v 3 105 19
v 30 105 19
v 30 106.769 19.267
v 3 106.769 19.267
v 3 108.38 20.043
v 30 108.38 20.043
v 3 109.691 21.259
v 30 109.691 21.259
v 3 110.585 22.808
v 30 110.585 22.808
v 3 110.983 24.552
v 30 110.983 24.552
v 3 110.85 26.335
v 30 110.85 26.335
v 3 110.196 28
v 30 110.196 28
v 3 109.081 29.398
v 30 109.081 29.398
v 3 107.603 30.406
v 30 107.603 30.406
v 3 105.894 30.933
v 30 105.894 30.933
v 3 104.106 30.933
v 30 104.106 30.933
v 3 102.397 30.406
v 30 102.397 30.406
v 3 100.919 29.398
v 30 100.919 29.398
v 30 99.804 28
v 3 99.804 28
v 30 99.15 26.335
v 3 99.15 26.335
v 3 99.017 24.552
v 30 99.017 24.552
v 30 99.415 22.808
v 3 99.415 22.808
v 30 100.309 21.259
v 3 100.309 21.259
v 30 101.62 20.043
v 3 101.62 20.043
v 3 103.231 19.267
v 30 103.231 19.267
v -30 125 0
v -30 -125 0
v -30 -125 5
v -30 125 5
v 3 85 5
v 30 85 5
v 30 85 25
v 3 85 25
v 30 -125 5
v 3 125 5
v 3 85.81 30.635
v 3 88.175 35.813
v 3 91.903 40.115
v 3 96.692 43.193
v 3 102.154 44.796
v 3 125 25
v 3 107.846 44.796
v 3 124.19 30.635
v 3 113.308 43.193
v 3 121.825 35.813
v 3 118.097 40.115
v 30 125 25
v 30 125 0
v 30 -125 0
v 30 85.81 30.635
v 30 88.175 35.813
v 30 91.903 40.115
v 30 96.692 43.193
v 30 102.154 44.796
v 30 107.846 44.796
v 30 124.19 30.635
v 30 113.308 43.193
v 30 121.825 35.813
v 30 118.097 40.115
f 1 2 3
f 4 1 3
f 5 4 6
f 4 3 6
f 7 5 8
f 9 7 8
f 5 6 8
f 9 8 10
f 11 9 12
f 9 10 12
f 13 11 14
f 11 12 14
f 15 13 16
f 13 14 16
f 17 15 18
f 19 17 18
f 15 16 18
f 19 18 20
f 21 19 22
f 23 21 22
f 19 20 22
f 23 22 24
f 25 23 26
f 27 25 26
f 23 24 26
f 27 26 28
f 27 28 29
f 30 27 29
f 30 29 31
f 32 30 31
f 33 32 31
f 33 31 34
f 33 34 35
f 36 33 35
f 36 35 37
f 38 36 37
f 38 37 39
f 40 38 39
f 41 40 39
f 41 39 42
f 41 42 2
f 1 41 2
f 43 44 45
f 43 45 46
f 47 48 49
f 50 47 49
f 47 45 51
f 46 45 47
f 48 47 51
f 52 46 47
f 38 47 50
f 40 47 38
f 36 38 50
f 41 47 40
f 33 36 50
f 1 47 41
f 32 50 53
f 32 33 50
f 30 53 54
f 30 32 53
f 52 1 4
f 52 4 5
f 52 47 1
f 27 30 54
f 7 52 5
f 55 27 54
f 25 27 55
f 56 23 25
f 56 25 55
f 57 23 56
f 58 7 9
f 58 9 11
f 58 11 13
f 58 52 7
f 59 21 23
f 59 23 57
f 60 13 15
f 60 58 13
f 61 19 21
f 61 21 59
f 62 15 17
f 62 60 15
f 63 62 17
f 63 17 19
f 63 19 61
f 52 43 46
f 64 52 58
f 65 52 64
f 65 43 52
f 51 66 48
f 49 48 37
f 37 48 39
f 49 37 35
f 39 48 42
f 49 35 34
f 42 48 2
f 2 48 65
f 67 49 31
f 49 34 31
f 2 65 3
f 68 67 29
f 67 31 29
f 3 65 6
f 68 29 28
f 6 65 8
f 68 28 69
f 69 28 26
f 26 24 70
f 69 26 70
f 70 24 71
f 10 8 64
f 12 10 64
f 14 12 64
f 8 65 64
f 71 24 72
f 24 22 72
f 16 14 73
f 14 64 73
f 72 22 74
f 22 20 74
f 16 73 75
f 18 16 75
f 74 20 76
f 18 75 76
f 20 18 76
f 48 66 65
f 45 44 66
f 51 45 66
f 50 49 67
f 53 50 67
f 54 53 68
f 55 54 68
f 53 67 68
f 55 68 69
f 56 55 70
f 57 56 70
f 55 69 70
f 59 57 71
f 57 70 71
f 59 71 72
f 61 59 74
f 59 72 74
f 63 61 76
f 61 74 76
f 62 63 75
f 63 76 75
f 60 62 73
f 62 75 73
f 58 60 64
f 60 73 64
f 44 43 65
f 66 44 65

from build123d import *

# Parameters (mm, degrees)
SKETCH1_W           = 60
SKETCH1_H           = 250
BOSS_EXTRUDE1_DEPTH = 5
BOSS_EXTRUDE2_DEPTH = 27
SKETCH3_R           = 6
CUT_EXTRUDE1_DEPTH  = 146.773797371


with BuildPart() as part:
    # Sketch1 → Boss-Extrude1 (new body)
    with BuildSketch(Plane.XY):
        Rectangle(SKETCH1_W, SKETCH1_H)
    extrude(amount=BOSS_EXTRUDE1_DEPTH)

    # Sketch2 → Boss-Extrude2 (add)
    with BuildSketch(Plane(origin=(30, 0, 0), x_dir=(0, 0, -1), z_dir=(1, 0, 0))):
        with BuildLine():
            Line((-5, 125), (-5, 85))
            Line((-5, 85), (-25, 85))
            ThreePointArc((-25, 85), (-45, 105), (-25, 125))
            Line((-25, 125), (-5, 125))
        make_face()
    extrude(amount=-BOSS_EXTRUDE2_DEPTH)

    # Sketch3 → Cut-Extrude1 (cut, through all)
    with BuildSketch(Plane(origin=(30, 0, 0), x_dir=(0, 0, -1), z_dir=(1, 0, 0))):
        with Locations((-25, 105)):
            Circle(SKETCH3_R)
    extrude(amount=-CUT_EXTRUDE1_DEPTH, mode=Mode.SUBTRACT)


solid = part.part
